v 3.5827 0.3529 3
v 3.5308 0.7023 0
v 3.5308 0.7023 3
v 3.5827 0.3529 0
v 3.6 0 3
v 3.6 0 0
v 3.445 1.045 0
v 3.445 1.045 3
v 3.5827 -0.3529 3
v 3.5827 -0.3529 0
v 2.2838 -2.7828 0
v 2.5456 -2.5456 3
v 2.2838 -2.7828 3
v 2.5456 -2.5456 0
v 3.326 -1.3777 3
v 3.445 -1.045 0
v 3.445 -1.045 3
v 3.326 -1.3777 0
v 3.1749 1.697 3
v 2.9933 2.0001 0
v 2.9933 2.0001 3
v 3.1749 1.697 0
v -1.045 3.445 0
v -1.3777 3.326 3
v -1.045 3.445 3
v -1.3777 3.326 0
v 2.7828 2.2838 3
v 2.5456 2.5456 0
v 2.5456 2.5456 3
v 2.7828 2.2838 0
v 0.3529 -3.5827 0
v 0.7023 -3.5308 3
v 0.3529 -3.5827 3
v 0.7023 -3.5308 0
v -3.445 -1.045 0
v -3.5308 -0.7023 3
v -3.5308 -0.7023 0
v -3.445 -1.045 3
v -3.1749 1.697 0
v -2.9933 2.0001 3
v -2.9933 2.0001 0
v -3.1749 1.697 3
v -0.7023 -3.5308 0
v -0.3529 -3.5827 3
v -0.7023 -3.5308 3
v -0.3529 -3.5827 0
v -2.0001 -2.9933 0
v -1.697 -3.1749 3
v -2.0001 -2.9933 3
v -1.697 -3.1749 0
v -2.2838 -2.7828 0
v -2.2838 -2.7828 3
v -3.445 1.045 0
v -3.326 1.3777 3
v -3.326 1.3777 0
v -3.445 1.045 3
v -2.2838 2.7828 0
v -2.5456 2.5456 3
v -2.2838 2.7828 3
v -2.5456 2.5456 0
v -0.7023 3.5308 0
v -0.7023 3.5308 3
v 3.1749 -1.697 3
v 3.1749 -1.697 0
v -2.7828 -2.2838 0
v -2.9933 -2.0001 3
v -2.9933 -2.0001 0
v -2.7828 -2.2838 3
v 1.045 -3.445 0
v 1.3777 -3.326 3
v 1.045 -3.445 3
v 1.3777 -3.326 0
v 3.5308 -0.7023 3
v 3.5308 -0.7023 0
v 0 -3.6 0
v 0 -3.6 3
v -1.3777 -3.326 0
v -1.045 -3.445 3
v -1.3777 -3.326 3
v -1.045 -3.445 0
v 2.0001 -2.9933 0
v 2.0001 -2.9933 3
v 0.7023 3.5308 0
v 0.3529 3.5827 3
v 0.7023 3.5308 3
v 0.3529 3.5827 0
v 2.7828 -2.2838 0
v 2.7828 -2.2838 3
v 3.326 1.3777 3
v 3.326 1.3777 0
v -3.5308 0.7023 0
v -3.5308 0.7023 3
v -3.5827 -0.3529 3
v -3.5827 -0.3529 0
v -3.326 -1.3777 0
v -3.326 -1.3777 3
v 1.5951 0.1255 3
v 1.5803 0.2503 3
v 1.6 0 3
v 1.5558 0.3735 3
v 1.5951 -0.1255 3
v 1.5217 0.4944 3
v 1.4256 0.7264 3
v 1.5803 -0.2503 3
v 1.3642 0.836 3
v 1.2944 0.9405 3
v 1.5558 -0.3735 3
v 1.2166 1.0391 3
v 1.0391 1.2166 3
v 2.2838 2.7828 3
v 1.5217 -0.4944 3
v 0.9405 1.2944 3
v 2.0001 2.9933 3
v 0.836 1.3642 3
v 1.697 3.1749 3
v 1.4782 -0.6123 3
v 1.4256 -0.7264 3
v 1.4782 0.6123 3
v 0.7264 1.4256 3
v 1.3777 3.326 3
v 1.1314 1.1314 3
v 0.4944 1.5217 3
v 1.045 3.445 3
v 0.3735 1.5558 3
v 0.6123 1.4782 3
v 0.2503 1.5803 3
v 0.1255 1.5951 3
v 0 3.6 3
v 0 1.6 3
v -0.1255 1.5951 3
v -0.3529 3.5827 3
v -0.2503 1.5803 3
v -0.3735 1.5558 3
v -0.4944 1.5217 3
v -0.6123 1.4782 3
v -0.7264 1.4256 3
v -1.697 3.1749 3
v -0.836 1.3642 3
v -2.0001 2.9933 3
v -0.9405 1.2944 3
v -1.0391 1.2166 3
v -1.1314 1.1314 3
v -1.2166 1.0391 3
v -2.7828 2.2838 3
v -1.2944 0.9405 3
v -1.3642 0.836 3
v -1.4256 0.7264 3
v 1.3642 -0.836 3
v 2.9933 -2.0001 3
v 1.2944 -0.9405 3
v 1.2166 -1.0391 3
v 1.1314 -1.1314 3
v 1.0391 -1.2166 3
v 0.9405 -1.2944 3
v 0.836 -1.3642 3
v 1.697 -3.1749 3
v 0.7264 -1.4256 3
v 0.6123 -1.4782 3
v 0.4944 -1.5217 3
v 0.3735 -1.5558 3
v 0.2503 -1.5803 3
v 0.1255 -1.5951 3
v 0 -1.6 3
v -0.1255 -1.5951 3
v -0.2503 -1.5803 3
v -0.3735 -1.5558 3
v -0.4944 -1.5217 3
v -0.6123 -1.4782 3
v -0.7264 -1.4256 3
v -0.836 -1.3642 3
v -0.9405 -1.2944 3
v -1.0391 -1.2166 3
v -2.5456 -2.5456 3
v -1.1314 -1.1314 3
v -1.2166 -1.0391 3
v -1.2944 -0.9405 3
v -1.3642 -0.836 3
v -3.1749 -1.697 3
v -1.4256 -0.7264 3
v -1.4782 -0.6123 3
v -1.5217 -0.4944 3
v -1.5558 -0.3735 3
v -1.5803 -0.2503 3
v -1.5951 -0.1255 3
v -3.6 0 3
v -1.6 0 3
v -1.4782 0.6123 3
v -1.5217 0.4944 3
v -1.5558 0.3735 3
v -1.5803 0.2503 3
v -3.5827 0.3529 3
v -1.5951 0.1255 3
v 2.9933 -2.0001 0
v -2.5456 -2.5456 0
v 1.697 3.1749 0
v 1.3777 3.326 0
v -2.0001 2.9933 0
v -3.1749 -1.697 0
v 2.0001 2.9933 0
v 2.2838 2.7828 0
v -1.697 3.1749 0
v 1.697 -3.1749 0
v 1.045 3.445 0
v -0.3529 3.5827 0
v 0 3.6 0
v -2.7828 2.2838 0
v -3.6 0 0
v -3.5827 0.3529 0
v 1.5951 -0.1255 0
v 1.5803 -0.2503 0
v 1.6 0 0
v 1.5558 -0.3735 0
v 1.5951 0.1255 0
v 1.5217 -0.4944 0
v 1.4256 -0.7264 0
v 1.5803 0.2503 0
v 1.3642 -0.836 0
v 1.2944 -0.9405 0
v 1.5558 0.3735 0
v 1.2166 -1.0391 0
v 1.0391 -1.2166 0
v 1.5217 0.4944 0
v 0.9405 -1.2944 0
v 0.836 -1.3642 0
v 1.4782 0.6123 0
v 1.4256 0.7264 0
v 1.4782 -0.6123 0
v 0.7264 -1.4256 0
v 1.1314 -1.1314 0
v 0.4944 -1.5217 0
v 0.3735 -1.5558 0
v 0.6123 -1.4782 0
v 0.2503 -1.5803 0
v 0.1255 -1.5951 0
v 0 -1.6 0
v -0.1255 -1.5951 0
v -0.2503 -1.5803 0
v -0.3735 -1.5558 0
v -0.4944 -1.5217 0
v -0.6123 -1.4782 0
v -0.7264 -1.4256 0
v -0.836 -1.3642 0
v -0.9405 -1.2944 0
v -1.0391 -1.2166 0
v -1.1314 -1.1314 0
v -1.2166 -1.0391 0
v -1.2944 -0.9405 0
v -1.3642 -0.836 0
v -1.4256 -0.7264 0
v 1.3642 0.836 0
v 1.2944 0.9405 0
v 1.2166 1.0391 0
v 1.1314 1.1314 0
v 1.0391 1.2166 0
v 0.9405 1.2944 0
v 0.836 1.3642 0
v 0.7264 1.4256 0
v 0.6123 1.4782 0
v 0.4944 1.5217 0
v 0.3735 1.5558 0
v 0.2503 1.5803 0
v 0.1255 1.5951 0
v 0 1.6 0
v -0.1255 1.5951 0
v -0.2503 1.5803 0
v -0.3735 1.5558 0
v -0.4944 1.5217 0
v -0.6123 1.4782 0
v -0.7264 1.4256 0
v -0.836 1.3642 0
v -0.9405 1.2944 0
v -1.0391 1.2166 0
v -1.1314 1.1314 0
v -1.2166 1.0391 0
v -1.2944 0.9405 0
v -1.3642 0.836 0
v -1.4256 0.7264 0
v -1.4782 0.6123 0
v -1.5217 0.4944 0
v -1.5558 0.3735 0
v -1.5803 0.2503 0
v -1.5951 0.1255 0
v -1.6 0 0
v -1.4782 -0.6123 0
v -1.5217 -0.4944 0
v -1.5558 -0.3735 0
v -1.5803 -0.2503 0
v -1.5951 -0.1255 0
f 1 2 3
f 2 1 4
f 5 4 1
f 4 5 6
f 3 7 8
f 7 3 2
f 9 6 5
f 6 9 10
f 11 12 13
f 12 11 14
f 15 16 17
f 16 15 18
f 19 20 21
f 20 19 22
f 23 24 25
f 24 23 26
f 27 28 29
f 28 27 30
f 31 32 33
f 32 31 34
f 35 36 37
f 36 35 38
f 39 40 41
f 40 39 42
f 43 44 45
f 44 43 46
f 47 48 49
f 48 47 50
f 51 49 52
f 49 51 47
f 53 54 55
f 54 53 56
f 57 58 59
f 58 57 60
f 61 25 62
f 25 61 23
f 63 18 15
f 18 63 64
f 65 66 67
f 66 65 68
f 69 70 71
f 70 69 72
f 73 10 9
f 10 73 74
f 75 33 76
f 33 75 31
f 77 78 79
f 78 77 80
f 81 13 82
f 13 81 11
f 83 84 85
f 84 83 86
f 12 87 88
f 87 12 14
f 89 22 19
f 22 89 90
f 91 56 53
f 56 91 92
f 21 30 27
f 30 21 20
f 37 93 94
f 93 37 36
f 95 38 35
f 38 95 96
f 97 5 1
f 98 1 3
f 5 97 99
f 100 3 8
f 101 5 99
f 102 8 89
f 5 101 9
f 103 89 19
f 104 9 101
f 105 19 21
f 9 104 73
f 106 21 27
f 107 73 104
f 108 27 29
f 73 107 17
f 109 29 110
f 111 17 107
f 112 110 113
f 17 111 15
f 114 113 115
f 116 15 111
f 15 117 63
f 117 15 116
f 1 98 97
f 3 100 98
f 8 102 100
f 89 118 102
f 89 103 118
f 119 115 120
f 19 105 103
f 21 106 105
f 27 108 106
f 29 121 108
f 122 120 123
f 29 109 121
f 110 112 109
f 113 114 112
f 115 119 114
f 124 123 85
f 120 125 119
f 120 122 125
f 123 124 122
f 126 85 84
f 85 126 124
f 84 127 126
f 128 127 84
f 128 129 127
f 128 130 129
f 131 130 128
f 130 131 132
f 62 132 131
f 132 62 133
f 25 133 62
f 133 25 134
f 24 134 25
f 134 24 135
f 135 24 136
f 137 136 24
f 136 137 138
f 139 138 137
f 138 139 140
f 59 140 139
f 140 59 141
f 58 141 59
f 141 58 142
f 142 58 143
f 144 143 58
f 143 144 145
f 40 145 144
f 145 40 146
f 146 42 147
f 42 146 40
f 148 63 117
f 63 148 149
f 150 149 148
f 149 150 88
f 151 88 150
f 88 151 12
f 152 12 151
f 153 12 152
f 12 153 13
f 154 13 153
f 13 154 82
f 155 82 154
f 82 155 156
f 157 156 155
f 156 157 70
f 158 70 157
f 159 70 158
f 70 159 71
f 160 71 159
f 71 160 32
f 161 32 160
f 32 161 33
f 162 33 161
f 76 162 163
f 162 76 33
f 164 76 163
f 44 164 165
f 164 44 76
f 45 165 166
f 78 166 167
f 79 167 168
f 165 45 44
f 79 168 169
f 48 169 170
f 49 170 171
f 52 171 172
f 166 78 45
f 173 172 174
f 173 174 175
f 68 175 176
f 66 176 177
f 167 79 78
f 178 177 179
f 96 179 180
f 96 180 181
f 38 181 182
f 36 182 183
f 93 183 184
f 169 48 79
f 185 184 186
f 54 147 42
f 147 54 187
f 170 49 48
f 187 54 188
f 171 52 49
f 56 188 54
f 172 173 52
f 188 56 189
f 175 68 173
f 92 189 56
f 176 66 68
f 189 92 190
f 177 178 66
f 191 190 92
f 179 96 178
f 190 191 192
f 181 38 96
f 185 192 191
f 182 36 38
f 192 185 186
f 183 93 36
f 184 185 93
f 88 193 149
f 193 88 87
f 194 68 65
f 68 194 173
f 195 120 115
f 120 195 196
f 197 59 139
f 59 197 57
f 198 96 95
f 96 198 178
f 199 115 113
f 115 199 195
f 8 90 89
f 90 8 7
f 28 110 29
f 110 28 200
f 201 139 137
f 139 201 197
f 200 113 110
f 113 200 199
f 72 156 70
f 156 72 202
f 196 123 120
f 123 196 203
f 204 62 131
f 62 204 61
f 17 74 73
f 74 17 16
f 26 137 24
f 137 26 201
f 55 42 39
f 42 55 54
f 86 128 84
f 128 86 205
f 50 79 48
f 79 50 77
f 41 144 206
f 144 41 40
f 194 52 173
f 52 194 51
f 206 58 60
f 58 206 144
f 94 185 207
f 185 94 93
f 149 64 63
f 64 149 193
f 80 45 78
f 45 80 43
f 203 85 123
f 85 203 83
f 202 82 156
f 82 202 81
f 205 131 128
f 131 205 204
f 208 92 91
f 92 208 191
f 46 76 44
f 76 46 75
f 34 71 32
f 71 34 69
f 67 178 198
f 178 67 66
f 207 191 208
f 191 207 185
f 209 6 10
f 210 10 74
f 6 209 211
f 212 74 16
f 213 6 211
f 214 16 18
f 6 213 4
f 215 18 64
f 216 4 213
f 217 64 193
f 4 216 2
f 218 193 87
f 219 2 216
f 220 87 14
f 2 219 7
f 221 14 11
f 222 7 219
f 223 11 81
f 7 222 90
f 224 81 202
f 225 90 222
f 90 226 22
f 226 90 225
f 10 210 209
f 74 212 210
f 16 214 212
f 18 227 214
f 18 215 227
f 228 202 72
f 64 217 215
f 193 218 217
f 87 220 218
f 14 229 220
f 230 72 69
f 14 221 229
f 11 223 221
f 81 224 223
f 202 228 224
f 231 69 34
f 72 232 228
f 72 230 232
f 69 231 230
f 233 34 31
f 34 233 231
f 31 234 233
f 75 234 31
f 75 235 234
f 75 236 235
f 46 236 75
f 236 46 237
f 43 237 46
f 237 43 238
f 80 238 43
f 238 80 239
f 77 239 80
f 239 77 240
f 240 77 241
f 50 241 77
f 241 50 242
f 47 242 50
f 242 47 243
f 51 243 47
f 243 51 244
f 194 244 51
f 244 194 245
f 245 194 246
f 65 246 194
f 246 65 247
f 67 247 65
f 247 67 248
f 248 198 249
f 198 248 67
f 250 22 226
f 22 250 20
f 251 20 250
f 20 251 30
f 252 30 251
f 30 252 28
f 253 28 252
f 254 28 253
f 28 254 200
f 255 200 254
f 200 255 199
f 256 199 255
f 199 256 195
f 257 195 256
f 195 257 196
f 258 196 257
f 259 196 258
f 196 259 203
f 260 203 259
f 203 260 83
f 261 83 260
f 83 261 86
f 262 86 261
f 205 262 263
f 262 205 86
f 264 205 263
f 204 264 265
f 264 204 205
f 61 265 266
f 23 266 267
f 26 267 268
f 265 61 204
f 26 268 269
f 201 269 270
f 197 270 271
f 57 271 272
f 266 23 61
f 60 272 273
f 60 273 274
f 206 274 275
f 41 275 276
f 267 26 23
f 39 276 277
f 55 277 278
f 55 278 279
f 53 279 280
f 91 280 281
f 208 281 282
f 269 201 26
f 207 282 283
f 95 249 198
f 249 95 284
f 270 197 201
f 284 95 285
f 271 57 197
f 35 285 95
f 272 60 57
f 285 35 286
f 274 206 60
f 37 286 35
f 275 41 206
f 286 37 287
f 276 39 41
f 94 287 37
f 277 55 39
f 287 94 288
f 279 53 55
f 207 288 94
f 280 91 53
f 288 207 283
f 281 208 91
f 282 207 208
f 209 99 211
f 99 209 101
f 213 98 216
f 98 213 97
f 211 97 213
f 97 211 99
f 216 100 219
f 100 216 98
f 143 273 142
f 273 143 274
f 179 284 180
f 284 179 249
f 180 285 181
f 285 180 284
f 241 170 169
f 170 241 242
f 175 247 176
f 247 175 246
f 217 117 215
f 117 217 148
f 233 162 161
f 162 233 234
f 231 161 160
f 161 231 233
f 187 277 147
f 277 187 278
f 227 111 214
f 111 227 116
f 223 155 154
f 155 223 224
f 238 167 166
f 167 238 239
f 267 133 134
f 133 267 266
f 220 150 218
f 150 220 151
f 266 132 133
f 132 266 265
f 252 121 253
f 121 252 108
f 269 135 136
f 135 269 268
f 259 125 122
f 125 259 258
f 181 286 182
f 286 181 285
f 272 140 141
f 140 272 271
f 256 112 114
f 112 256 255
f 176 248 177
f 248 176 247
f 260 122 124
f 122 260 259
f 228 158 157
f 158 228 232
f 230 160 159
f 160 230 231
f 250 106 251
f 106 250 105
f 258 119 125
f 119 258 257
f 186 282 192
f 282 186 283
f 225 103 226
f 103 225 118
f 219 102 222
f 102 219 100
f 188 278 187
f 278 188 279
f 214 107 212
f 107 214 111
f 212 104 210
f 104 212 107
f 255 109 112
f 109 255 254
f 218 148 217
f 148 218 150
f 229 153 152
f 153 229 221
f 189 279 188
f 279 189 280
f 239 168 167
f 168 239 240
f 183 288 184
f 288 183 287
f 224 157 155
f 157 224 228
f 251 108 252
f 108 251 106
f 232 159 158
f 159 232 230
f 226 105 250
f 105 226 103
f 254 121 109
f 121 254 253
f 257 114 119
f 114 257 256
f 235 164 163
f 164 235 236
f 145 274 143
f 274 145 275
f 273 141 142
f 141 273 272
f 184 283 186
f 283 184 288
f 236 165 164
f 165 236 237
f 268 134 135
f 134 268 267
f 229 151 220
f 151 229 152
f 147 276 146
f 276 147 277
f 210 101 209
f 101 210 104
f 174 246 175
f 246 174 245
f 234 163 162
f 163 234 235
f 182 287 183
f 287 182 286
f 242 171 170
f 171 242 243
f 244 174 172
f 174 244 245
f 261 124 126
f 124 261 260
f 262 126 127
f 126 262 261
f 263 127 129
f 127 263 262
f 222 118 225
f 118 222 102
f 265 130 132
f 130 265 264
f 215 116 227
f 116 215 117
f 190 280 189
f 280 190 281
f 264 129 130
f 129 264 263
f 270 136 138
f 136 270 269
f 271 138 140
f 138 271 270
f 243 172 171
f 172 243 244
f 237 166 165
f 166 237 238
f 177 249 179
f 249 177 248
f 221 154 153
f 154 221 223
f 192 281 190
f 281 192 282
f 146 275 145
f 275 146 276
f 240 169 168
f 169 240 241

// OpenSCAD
// $URL: svn+ssh://mrwhat@ssh.boim.com/home/mrwhat/svn/Walker/trunk/Klann.scad $
// $Id: Klann.scad 76 2013-05-18 16:47:22Z aaron $

//   Round Stock       diam(mm)
//=================    ========
// round toothpic         2.2
// Bamboo skewer          3.6      (max 3.8)
// smiths skewer             4             4.17 to 4.29, 3.96 to 4.1, 3.56 to 3.73
// smaller skewer         2.86     2.81-2.96
// even smaller skewer    2.24     2.2-2.28
// Wire Hanger            2.0      (max 2.1)
// Thin paperclip         0.77
// Thick paperclip        1.44

HoleRad=.75+.1;  // extra to compensate for extruded filament spill-over
LinkRad=3;
BarHeight=3;
NodeHeight=BarHeight+1;

LargeHole=1.4+.2;  // radius (mm)
XLargeHole=2;  // for larger diameter bamboo skewers from kroger

// Define PART to one of the following values to generate model for desired part.
// Simple, NON-BRACED version:
//    main,pulley,AC, rocker(2), BH(2), DE(2), leg(2)
//         just flip rocker, foot over for left vs. right one
PART="spacer";

/// Original, default linkage, reversed from patent:
//MainScale=67.829;  // scale crank from .268 to 17.5, for 10:1 scale for use with 175mm bicycle crankset
//
//B =  [-.599, -.176] * MainScale;
//D = B + [.366,.792] * MainScale;
//AC = .268 * MainScale;
//BH = .3204 * MainScale;
//CH = .59  * MainScale;
//CF = 1.1051 * MainScale;
//DE = .5176 * MainScale;
//EF = .89656 * MainScale;
//FG = .89654 * MainScale;
//EG = 1.732 * MainScale;
//FH = .52205 * MainScale;

/// Favorite optimization, 5/17/2013
MainScale=1;
AC=17.5*MainScale;
B =  [-38.8, -12.5] * MainScale;
D = [-14.6, 41.9] * MainScale;
BH = 23.7 * MainScale;
CH = 38.8  * MainScale;
CF = 73.4 * MainScale;
DE = 34.1 * MainScale;
EF = 57.7 * MainScale;
FG = 59 * MainScale;
EG = 111.7 * MainScale;
FH = 35.2 * MainScale;

CHproj = (CF*CF + CH*CH - FH*FH) / (2*CF);
Hperp = sqrt(CH*CH - CHproj*CHproj);  // for rocker bar
Hx = (EG*EG - EF*EF - FG*FG)/(2*FG);
Hip = [Hx,sqrt(EF*EF - Hx*Hx)];

module cyl(nodeHeight,nodeRad,nFace)
{ cylinder(h=nodeHeight,r=nodeRad,$fn=nFace); }

module hole(holeHeight,holeRad,nFace)
{ translate([0,0,-.1]) cyl(holeHeight+.2,holeRad,nFace); }

module linkage(length,h1,h2) {
r1=(h1>LinkRad-2)?h1+2:LinkRad;
r2=(h2>LinkRad-2)?h2+2:LinkRad;
echo("linkage ",length," r1=",r1," r2=",r2);
difference() { union() {
   translate([0,-LinkRad,0]) cube([length,2*LinkRad,BarHeight]);
   cyl(NodeHeight,r1,48);
   translate([length,0,0]) cyl(NodeHeight,r2,48);
   }
   hole(NodeHeight,h1,80);
   translate([length,0,0]) hole(NodeHeight,h2,80);
}}

module rockerBar(dLeft,dPerp,dRight,holeLeft,holePerp,holeRight) {
rLeft=(holeLeft>LinkRad-2)?holeLeft+2:LinkRad;
rPerp=(holePerp>LinkRad-2)?holePerp+2:LinkRad;
rRight=(holeRight>LinkRad-2)?holeRight+2:LinkRad;
difference() { union() {
  translate([-dLeft,0,0]) cyl(NodeHeight,rLeft,48);
  translate([0,dPerp,0]) cyl(NodeHeight,rPerp,48);
  translate([dRight,0,0])cyl(NodeHeight,rRight,48);
  hull(){
     translate([-dLeft,0,0]) cyl(NodeHeight,LinkRad,48);
     translate([0,dPerp,0]) cyl(NodeHeight,LinkRad,48);
     translate([dRight,0,0])cyl(NodeHeight,LinkRad,48); }
  }
  translate([-dLeft,0,0]) hole(NodeHeight,holeLeft,80);
  translate([0,dPerp,0]) hole(NodeHeight,holePerp,80);
  translate([dRight,0,0])hole(NodeHeight,holeRight,80);
}}

module leg(shin,hipLoc) {
//kneeThick = 0.3;
//kneeCap = [hipLoc[1]*kneeThick,-hipLoc[0]*kneeThick];
//kneeCap = [0,-hipLoc[1]*.5];
kneeCap = [0,-LinkRad*7];
hip0 = [hipLoc[0],hipLoc[1],0];
cap0 = [kneeCap[0],kneeCap[1],0];
difference() { union() {
   cyl(NodeHeight,2.5*LinkRad,24);
   hull() { translate([0,-3.5*LinkRad,0]) cyl(NodeHeight,LinkRad,48);
      translate([-shin,0,0]) cyl(NodeHeight,LinkRad,48);}
   hull() { cyl(NodeHeight,LinkRad,48);
      translate(hip0) cyl(NodeHeight,LinkRad,48);}
   hull() {
      translate([-shin,0,0]) cyl(NodeHeight,LinkRad,48);
      translate(cap0) cyl(NodeHeight,LinkRad,48); }
   hull() {
      translate(hip0) cyl(NodeHeight,LinkRad,48);
      translate(cap0) cyl(NodeHeight,LinkRad,48); }
   linear_extrude(height=BarHeight) polygon(points=[
         [-.8*shin,-LinkRad],kneeCap,hipLoc,[0,-1.1*LinkRad]], paths=[[0,1,2,3]]);
   }
   hole(NodeHeight,HoleRad,80);
   translate([hipLoc[0],hipLoc[1],0]) hole(NodeHeight,HoleRad,80);

   // optional bulk-reduction holes. they mostly just look neat.
   translate([-.4*LinkRad,-4.3*LinkRad,0]) hole(NodeHeight,1.2*LinkRad,64);
   translate([-4*LinkRad,-4*LinkRad,0]) hole(NodeHeight,.8*LinkRad,64);
   translate([-6.5*LinkRad,-3.5*LinkRad,0]) hole(NodeHeight,.6*LinkRad,64);
   translate([2.3*LinkRad,-2.2*LinkRad,0]) hole(NodeHeight,.8*LinkRad,64);
   translate([4*LinkRad,-.6*LinkRad,0]) hole(NodeHeight,.6*LinkRad,64);
   translate([5.5*LinkRad,.8*LinkRad,0]) hole(NodeHeight,.4*LinkRad,64);
}}



module pulley(pr,lip) {
//pr=Bx/3; // pulley radius, outside
//lip = 2;
nFaces=180;
hr=2.5; // hole rad
cr=pr*0.45;
tr=pr*0.7;
difference() { union() {
   cylinder(h=lip,r=pr,$fn=nFaces);
   cylinder(h=1.5*lip,r=pr-lip,$fn=nFaces);
   for (a=[90,210,330]) {
      translate([cos(a)*tr,sin(a)*tr,1.3*lip]) cylinder(h=lip,r=hr*0.3,$fn=80); }
   }
   translate([0,0,-1]) cylinder(h=1.5*lip+2,r=LargeHole,$fn=80);
   for (a=[0,60,120,180,240,300]) {
      translate([cos(a)*cr,sin(a)*cr,-1]) cylinder(h=1.5*lip+2,r=hr,$fn=80); }
   for (a=[30,150,270]) {
      translate([cos(a)*tr,sin(a)*tr,-1]) cylinder(h=1.5*lip+2,r=hr*0.5,$fn=80); }
}}


module mainKlann(pB,pD) {
thick=4;  // bar thickness
hr = LargeHole;  // hole radius
nr = hr * 2.5;  // node radius around hole
sep = 5;  // 1/2 seperation distance between main bars
lip=3;
fixedPoint = [[0,0,0],[pB[0],pB[1],0],[-pB[0],pB[1],0],[pD[0],pD[1],0],[-pD[0],pD[1],0]];
difference() { union() {
   for (i=[0:4]) { translate(fixedPoint[i]) cyl(thick+sep,nr,48); }
   hull() { for (i=[1:2]) { translate(fixedPoint[i]) cyl(thick,LinkRad,48); }}
   hull() { for (i=[1,3]) { translate(fixedPoint[i]) cyl(thick,LinkRad,48); }}
   hull() { for (i=[0,3]) { translate(fixedPoint[i]) cyl(thick,LinkRad,48); }}
   hull() { for (i=[2,4]) { translate(fixedPoint[i]) cyl(thick,LinkRad,48); }}
   hull() { for (i=[0,4]) { translate(fixedPoint[i]) cyl(thick,LinkRad,48); }}
   hull() { cyl(thick,LinkRad,48); translate([0,pB[1],0]) cyl(thick,LinkRad,48);}
   translate([pD[0],pD[1]+hr,0]) cube([-2*pD[0],nr-hr,thick+sep]);
   linear_extrude(height=2) polygon(points=[pB,[pD[0],pD[1]+nr-.1],
             [-pD[0],pD[1]+nr-.1],[-pB[0],pB[1]]],paths=[[0,1,2,3]]);
   translate([pB[0]+2.4*nr,pB[1]+nr,0]) cyl(thick+sep+lip,2*nr,6);
   translate([-pB[0]-2.4*nr,pB[1]+nr,0]) {cyl(thick+sep,2*nr,6); cyl(thick+sep+lip,2*nr-3,6); }

   // show pulley over main support for size comparison, diagnostic only
   //translate([0,0,15]) {assign(lenB=sqrt(pB[0]*pB[0]+pB[1]*pB[1])){pulley(0.8*(lenB-10*LargeHole),2);}}
   }
   translate([pB[0]+2.4*nr,pB[1]+nr,thick+sep-.75]) cyl(lip+2,2*nr-2,6);
   for (i=[0:4]) { translate(fixedPoint[i]) hole(thick+sep,hr,80); }
}}




//=====================================================

if      (PART=="AC") { linkage(AC,HoleRad, LargeHole); }
else if (PART=="BH") { linkage(BH,HoleRad,XLargeHole); }
else if (PART=="DE") { linkage(DE,HoleRad,XLargeHole); }
else if (PART=="rocker") { rockerBar(CHproj,Hperp,CF-CHproj,LargeHole,HoleRad,HoleRad); }
else if (PART=="leg") { leg(FG-LinkRad,Hip); }
else if (PART=="main") { mainKlann(B,D); }
else if (PART=="pulley") { assign(lenB=sqrt(B[0]*B[0]+B[1]*B[1])){pulley(0.8*(lenB-10*LargeHole),2);}}
else { difference() {cyl(BarHeight,LargeHole+2,64); hole(BarHeight,LargeHole,80); }} // spacer
